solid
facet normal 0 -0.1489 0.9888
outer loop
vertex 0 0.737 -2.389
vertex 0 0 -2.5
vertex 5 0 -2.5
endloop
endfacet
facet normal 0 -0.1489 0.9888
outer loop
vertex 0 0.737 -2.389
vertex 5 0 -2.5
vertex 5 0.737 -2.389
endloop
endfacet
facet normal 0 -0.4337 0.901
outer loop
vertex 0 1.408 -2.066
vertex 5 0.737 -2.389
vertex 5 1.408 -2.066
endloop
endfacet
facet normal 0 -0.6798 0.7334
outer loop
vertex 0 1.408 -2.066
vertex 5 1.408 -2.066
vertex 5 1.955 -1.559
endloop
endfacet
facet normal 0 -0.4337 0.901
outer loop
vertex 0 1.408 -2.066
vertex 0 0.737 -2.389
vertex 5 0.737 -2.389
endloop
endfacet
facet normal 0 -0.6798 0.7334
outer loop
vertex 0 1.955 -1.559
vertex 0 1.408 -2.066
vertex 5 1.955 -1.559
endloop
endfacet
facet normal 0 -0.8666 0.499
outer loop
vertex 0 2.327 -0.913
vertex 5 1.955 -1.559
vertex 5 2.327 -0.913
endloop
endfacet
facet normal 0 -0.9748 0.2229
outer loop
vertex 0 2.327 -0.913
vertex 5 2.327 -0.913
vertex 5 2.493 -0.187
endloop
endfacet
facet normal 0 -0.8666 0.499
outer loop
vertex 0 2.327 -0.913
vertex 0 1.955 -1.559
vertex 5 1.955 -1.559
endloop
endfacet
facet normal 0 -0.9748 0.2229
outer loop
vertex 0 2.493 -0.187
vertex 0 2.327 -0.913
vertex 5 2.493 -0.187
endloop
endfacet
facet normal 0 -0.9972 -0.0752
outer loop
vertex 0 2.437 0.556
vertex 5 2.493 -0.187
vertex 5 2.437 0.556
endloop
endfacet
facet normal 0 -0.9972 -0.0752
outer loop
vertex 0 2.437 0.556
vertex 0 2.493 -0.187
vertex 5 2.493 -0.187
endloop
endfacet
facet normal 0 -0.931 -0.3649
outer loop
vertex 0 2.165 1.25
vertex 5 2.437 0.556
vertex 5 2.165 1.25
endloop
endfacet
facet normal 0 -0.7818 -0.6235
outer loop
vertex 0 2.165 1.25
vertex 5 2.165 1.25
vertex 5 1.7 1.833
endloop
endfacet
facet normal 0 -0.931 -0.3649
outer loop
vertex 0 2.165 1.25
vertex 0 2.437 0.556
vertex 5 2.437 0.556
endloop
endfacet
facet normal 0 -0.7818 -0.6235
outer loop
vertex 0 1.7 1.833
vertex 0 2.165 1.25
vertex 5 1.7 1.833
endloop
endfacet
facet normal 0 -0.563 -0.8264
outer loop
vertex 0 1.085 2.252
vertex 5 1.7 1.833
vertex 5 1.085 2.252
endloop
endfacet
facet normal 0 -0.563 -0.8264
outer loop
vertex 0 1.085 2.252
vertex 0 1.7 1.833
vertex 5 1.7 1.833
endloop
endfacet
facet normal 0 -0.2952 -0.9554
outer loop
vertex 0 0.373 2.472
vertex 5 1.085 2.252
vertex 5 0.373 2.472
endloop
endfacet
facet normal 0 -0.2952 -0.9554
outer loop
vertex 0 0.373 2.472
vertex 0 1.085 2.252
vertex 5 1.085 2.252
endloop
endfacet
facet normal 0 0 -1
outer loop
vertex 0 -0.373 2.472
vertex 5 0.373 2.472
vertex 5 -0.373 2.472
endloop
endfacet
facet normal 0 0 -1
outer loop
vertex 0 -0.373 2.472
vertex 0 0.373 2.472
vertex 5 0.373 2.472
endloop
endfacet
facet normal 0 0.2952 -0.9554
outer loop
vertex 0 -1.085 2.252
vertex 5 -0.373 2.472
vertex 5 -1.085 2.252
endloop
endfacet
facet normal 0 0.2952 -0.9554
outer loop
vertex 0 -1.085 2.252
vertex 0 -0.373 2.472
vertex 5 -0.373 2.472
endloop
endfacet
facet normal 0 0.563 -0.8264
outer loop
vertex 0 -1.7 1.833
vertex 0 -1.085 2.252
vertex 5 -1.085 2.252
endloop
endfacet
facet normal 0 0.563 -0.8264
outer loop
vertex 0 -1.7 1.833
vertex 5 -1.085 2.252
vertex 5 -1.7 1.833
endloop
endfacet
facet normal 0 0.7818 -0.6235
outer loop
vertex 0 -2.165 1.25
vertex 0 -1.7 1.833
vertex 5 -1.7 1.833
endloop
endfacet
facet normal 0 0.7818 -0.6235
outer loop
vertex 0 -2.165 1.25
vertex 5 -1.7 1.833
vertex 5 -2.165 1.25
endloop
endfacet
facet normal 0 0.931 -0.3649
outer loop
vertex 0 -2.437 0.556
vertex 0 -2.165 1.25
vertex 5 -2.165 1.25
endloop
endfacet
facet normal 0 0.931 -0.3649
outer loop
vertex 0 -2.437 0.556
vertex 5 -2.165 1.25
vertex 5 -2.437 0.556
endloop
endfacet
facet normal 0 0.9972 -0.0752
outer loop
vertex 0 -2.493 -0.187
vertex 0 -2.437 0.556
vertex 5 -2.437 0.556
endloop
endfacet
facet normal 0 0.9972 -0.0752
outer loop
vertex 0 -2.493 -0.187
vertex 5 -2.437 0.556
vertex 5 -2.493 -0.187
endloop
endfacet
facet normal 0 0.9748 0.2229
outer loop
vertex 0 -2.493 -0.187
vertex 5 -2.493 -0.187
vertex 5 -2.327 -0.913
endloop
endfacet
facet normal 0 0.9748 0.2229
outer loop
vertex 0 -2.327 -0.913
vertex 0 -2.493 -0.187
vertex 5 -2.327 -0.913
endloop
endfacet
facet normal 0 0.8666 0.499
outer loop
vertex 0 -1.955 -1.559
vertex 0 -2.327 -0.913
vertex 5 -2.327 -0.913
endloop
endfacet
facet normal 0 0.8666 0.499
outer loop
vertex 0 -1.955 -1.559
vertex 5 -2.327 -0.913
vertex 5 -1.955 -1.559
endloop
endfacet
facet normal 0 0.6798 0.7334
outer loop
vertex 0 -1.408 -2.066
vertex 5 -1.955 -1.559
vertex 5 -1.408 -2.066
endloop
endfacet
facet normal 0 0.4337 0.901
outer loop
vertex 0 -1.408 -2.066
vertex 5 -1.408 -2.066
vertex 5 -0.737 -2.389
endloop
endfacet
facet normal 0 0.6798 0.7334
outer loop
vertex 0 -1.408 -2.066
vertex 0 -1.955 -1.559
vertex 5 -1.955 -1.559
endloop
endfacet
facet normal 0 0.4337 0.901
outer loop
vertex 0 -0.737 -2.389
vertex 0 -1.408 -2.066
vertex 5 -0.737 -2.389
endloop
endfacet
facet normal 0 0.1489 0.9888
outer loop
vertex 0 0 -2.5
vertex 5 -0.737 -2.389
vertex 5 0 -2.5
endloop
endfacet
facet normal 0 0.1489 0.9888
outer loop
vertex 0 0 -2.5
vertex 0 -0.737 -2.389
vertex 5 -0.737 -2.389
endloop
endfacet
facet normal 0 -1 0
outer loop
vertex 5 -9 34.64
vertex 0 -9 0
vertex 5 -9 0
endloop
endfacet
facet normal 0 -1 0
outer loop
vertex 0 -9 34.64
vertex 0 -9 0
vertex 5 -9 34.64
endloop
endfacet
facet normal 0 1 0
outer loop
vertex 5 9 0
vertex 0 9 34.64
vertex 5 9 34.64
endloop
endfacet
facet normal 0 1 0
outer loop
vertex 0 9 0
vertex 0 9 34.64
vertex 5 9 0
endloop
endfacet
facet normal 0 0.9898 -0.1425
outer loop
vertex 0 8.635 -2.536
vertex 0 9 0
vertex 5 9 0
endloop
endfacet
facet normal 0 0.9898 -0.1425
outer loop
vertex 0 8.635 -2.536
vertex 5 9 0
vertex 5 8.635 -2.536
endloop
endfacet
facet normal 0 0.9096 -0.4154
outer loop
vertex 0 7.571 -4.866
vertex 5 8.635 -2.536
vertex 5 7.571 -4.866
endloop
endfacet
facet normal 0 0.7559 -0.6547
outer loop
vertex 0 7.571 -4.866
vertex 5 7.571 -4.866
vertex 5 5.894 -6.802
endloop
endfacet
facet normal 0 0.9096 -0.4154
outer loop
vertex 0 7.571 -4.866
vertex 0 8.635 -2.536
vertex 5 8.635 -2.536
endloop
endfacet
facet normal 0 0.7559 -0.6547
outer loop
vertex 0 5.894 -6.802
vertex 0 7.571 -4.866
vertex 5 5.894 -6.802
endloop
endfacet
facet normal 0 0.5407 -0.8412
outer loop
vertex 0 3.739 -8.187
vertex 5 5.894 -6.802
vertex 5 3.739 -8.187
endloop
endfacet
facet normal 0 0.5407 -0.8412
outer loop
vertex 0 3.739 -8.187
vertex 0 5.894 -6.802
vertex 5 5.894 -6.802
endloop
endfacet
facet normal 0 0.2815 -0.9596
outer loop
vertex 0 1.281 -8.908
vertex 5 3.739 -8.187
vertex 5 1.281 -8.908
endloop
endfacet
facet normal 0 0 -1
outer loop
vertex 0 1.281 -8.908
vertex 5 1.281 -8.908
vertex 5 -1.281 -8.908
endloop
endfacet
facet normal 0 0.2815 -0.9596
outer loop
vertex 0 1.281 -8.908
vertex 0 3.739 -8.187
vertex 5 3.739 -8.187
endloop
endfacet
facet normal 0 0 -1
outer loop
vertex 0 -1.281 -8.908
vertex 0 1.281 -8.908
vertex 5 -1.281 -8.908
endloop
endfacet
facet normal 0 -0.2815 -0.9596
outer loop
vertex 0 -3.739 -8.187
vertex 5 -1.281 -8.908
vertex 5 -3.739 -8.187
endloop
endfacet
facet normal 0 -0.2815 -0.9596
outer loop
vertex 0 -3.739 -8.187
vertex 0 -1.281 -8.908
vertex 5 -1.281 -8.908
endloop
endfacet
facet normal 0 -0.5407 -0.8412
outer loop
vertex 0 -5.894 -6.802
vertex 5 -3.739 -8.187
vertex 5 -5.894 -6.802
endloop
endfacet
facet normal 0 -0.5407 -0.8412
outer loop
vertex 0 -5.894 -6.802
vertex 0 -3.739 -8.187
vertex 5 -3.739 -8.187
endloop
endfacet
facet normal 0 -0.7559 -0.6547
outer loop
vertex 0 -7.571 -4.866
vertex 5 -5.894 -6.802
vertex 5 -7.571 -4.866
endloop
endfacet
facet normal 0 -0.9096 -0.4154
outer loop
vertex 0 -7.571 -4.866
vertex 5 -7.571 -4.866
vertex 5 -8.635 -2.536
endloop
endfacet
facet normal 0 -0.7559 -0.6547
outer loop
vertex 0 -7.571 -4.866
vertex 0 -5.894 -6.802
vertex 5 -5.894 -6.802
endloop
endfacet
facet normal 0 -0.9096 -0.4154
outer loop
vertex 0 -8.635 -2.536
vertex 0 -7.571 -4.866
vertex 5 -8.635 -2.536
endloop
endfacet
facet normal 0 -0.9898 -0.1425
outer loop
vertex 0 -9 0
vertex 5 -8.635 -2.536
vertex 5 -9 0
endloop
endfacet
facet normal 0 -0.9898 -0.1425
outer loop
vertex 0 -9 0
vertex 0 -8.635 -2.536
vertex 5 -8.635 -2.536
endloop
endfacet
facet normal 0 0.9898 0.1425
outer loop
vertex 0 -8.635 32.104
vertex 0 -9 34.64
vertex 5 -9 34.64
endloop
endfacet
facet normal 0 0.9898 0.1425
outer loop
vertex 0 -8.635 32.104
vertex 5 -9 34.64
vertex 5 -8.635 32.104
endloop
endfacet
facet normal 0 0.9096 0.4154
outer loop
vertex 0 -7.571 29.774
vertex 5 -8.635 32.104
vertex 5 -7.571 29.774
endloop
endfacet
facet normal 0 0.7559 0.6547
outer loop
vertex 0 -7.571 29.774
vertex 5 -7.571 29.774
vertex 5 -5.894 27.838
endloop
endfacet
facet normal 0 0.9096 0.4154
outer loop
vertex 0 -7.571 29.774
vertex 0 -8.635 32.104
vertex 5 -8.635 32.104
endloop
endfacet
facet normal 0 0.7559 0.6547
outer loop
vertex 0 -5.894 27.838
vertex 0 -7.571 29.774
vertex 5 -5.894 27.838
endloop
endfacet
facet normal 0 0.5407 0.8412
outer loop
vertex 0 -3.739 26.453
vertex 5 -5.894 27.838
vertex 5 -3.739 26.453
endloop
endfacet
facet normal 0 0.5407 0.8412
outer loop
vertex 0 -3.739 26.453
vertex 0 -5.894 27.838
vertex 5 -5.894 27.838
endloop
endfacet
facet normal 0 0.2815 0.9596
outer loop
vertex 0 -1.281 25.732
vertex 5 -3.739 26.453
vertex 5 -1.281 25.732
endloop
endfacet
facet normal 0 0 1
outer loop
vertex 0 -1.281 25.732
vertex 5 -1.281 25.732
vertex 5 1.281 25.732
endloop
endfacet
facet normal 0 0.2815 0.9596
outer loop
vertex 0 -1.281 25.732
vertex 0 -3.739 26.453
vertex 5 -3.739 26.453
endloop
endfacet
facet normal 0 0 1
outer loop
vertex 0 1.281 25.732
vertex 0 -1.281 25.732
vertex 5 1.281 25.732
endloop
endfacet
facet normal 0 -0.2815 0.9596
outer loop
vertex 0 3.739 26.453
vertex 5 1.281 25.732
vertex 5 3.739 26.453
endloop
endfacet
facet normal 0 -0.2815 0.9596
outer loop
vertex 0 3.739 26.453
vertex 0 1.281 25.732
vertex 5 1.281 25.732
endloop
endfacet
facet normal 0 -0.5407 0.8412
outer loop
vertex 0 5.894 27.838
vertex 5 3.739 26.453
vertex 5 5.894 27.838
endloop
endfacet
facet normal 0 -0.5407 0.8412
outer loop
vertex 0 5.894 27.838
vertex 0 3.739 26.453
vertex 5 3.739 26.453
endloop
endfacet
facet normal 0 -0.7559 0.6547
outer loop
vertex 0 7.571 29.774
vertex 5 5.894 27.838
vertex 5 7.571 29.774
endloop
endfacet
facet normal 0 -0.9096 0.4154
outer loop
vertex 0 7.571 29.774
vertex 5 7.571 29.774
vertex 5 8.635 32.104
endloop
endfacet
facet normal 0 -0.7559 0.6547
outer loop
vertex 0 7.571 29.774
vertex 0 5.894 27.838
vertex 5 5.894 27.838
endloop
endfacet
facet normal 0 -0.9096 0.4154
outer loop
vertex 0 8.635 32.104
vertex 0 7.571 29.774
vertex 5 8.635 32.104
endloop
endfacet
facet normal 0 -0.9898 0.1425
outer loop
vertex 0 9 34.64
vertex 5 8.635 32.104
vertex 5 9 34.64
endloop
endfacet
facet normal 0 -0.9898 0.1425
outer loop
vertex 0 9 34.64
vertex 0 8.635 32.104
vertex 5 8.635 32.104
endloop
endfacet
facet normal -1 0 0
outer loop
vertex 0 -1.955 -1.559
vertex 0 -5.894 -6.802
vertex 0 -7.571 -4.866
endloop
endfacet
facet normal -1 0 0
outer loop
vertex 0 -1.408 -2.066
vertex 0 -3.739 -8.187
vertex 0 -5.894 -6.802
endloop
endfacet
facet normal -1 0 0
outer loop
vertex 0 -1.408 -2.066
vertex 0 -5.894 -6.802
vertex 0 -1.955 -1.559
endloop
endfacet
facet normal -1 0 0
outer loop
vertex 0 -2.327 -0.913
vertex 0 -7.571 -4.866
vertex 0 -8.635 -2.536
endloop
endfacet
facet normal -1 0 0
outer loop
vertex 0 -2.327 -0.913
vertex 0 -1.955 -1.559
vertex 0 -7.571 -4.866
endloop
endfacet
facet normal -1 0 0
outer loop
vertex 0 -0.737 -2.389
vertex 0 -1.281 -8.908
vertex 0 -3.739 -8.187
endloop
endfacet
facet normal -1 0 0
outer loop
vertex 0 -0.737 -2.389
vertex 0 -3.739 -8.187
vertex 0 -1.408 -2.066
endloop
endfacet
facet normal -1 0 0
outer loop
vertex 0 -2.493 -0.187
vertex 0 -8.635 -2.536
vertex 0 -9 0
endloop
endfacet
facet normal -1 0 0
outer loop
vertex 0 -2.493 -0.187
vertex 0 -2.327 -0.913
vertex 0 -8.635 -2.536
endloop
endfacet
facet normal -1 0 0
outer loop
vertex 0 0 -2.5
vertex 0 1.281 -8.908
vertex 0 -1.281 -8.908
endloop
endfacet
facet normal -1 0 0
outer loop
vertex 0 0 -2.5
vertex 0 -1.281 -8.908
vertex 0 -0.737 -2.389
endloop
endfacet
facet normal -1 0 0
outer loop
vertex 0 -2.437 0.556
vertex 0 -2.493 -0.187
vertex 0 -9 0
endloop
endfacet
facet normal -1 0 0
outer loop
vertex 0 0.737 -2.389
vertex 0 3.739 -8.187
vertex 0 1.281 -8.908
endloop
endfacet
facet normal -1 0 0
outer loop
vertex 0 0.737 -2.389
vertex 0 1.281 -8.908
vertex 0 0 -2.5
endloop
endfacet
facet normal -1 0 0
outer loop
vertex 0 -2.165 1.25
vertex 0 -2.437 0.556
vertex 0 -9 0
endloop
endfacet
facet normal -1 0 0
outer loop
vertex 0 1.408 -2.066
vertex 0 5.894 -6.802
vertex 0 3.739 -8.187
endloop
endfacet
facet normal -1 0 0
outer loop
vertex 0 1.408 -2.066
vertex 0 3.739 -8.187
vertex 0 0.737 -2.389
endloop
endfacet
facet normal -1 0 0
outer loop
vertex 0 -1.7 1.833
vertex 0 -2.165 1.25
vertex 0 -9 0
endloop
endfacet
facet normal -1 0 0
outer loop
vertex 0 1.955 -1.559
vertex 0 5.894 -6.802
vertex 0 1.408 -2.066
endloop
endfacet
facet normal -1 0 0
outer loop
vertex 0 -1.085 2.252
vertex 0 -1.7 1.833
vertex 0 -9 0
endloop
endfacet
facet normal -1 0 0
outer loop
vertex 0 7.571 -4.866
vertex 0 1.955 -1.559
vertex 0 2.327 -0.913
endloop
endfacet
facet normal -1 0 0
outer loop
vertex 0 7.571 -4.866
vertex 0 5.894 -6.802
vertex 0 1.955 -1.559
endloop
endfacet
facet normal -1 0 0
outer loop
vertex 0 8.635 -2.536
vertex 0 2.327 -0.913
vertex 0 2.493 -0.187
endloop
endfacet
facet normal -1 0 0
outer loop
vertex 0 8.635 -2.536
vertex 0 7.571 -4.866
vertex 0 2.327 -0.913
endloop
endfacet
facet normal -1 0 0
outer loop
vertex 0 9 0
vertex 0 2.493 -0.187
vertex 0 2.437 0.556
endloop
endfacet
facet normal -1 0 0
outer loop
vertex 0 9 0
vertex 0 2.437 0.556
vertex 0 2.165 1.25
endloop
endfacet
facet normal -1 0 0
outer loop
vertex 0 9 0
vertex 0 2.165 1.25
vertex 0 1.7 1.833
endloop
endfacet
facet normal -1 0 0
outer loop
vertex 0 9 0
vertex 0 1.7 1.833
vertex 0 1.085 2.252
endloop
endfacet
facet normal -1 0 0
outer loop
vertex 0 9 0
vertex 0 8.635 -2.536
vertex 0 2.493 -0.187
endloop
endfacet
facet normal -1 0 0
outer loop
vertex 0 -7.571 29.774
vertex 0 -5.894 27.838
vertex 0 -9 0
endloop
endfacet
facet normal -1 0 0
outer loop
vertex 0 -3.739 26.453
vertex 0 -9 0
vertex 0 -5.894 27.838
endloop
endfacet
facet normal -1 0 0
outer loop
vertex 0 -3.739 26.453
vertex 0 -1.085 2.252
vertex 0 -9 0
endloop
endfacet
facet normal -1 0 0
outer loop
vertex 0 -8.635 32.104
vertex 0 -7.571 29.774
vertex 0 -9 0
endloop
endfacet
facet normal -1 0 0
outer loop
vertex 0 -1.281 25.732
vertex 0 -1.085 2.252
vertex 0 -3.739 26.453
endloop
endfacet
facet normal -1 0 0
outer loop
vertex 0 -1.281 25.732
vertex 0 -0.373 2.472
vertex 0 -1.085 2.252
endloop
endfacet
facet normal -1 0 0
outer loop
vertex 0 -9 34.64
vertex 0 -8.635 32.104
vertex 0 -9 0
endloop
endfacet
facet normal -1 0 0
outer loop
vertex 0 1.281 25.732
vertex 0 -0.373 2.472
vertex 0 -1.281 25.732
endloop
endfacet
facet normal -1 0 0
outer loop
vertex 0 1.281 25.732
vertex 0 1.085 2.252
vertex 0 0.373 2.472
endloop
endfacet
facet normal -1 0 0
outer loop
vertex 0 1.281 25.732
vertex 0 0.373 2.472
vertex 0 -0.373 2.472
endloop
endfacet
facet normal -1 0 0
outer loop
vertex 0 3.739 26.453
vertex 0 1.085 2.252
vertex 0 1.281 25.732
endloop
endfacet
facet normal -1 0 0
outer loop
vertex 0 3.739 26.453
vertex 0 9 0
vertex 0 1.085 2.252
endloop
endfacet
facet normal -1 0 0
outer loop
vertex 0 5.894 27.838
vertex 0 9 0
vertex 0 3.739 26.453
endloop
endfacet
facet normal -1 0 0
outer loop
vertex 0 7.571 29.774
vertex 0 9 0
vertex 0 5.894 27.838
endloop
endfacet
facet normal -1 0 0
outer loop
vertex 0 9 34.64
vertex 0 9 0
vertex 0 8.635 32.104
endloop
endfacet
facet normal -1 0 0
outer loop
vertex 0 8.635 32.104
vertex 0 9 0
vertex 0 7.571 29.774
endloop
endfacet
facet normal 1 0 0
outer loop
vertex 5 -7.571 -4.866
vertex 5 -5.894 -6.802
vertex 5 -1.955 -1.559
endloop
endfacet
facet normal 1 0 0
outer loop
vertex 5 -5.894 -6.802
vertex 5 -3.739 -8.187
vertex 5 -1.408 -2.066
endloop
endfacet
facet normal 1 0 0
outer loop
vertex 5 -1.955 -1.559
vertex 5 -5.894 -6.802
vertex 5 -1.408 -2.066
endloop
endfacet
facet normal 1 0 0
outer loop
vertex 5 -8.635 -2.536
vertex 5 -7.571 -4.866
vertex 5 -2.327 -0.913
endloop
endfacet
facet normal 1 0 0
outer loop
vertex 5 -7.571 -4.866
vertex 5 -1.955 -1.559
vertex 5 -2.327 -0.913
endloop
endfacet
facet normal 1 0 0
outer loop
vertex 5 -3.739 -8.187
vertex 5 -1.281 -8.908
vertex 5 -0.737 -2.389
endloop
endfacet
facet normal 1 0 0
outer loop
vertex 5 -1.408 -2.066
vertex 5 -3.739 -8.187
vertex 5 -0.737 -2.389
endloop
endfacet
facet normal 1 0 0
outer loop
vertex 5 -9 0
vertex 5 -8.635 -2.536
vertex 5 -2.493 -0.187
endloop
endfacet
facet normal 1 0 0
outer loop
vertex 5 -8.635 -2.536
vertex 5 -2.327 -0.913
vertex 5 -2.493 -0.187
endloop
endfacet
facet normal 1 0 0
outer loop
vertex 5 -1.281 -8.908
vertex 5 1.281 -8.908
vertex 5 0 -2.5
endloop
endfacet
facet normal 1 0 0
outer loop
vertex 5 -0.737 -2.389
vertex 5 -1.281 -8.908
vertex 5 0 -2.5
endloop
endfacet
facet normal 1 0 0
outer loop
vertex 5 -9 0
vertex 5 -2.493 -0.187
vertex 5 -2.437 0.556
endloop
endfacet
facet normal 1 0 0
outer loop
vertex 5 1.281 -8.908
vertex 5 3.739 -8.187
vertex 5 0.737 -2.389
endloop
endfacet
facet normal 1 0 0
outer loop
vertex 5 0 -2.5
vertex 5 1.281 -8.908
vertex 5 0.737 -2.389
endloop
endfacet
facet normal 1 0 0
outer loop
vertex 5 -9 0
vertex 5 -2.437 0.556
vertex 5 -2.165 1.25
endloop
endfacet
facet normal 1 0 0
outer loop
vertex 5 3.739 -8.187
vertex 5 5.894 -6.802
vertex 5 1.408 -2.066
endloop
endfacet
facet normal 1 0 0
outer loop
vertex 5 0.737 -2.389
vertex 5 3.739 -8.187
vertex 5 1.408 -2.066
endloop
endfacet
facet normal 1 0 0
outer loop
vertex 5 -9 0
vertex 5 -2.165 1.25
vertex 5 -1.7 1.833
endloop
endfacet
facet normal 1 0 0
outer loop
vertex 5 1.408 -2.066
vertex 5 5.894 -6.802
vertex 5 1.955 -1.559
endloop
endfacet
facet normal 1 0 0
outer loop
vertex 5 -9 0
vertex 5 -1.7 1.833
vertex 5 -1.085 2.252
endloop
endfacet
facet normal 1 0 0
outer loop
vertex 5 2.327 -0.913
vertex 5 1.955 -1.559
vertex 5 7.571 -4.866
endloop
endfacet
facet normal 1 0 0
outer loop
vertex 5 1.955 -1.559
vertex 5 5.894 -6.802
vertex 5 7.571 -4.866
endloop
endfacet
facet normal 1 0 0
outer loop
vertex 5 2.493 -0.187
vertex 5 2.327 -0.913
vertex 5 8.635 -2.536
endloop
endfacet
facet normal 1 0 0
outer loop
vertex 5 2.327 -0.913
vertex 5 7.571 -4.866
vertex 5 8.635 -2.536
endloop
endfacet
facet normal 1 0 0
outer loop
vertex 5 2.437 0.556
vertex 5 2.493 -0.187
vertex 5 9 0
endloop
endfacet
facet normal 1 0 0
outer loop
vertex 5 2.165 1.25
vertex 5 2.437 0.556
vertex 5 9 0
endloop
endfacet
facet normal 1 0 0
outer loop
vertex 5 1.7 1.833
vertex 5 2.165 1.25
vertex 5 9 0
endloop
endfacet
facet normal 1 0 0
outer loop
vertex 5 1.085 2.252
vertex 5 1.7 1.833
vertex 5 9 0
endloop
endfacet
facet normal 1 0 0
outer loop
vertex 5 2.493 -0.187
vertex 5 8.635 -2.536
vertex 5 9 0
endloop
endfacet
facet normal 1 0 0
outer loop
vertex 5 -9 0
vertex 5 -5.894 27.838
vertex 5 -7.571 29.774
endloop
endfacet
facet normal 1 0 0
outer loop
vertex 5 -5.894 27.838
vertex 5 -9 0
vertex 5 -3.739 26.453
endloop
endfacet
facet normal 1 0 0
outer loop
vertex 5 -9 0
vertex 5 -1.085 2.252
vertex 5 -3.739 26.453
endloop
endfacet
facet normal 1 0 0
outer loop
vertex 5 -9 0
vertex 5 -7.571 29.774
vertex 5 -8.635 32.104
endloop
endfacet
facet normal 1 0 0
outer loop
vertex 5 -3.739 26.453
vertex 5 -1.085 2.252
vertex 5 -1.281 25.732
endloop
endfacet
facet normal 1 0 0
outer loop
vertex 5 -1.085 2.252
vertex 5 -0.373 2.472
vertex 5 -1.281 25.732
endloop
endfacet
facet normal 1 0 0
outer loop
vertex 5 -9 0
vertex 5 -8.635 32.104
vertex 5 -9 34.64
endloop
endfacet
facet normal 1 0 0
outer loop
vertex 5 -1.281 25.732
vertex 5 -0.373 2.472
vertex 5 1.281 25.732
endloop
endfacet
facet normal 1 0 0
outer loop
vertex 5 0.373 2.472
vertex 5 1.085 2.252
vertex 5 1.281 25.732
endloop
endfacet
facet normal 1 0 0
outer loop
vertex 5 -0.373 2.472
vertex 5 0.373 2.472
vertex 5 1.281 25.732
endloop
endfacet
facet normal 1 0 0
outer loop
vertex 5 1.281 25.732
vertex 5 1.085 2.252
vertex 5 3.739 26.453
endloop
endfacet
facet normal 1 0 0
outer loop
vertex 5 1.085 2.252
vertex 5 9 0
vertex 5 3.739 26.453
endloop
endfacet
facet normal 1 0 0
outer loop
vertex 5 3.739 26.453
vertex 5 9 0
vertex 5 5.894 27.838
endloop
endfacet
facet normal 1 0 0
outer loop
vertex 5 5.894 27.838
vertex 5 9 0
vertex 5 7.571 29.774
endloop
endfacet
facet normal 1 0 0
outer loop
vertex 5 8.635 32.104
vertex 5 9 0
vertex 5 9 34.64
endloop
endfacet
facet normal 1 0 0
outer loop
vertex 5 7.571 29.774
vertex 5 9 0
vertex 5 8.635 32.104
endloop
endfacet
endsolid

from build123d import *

# Parameters (mm, degrees)
SKETCH_3_R      = 2.5
EXTRUDE_3_DEPTH = 5


with BuildPart() as part:
    # 草圖3 → 填料-伸長3 (new body)
    with BuildSketch(Plane(origin=(0, 0, 0), x_dir=(0, 0, -1), z_dir=(1, 0, 0))):
        with BuildLine():
            Line((0, -9), (-34.64, -9))
            ThreePointArc((-34.64, -9), (-25.64, 0), (-34.64, 9))
            Line((-34.64, 9), (0, 9))
            ThreePointArc((0, 9), (9, 0), (0, -9))
        make_face()
        Circle(SKETCH_3_R, mode=Mode.SUBTRACT)
    extrude(amount=EXTRUDE_3_DEPTH)


solid = part.part
